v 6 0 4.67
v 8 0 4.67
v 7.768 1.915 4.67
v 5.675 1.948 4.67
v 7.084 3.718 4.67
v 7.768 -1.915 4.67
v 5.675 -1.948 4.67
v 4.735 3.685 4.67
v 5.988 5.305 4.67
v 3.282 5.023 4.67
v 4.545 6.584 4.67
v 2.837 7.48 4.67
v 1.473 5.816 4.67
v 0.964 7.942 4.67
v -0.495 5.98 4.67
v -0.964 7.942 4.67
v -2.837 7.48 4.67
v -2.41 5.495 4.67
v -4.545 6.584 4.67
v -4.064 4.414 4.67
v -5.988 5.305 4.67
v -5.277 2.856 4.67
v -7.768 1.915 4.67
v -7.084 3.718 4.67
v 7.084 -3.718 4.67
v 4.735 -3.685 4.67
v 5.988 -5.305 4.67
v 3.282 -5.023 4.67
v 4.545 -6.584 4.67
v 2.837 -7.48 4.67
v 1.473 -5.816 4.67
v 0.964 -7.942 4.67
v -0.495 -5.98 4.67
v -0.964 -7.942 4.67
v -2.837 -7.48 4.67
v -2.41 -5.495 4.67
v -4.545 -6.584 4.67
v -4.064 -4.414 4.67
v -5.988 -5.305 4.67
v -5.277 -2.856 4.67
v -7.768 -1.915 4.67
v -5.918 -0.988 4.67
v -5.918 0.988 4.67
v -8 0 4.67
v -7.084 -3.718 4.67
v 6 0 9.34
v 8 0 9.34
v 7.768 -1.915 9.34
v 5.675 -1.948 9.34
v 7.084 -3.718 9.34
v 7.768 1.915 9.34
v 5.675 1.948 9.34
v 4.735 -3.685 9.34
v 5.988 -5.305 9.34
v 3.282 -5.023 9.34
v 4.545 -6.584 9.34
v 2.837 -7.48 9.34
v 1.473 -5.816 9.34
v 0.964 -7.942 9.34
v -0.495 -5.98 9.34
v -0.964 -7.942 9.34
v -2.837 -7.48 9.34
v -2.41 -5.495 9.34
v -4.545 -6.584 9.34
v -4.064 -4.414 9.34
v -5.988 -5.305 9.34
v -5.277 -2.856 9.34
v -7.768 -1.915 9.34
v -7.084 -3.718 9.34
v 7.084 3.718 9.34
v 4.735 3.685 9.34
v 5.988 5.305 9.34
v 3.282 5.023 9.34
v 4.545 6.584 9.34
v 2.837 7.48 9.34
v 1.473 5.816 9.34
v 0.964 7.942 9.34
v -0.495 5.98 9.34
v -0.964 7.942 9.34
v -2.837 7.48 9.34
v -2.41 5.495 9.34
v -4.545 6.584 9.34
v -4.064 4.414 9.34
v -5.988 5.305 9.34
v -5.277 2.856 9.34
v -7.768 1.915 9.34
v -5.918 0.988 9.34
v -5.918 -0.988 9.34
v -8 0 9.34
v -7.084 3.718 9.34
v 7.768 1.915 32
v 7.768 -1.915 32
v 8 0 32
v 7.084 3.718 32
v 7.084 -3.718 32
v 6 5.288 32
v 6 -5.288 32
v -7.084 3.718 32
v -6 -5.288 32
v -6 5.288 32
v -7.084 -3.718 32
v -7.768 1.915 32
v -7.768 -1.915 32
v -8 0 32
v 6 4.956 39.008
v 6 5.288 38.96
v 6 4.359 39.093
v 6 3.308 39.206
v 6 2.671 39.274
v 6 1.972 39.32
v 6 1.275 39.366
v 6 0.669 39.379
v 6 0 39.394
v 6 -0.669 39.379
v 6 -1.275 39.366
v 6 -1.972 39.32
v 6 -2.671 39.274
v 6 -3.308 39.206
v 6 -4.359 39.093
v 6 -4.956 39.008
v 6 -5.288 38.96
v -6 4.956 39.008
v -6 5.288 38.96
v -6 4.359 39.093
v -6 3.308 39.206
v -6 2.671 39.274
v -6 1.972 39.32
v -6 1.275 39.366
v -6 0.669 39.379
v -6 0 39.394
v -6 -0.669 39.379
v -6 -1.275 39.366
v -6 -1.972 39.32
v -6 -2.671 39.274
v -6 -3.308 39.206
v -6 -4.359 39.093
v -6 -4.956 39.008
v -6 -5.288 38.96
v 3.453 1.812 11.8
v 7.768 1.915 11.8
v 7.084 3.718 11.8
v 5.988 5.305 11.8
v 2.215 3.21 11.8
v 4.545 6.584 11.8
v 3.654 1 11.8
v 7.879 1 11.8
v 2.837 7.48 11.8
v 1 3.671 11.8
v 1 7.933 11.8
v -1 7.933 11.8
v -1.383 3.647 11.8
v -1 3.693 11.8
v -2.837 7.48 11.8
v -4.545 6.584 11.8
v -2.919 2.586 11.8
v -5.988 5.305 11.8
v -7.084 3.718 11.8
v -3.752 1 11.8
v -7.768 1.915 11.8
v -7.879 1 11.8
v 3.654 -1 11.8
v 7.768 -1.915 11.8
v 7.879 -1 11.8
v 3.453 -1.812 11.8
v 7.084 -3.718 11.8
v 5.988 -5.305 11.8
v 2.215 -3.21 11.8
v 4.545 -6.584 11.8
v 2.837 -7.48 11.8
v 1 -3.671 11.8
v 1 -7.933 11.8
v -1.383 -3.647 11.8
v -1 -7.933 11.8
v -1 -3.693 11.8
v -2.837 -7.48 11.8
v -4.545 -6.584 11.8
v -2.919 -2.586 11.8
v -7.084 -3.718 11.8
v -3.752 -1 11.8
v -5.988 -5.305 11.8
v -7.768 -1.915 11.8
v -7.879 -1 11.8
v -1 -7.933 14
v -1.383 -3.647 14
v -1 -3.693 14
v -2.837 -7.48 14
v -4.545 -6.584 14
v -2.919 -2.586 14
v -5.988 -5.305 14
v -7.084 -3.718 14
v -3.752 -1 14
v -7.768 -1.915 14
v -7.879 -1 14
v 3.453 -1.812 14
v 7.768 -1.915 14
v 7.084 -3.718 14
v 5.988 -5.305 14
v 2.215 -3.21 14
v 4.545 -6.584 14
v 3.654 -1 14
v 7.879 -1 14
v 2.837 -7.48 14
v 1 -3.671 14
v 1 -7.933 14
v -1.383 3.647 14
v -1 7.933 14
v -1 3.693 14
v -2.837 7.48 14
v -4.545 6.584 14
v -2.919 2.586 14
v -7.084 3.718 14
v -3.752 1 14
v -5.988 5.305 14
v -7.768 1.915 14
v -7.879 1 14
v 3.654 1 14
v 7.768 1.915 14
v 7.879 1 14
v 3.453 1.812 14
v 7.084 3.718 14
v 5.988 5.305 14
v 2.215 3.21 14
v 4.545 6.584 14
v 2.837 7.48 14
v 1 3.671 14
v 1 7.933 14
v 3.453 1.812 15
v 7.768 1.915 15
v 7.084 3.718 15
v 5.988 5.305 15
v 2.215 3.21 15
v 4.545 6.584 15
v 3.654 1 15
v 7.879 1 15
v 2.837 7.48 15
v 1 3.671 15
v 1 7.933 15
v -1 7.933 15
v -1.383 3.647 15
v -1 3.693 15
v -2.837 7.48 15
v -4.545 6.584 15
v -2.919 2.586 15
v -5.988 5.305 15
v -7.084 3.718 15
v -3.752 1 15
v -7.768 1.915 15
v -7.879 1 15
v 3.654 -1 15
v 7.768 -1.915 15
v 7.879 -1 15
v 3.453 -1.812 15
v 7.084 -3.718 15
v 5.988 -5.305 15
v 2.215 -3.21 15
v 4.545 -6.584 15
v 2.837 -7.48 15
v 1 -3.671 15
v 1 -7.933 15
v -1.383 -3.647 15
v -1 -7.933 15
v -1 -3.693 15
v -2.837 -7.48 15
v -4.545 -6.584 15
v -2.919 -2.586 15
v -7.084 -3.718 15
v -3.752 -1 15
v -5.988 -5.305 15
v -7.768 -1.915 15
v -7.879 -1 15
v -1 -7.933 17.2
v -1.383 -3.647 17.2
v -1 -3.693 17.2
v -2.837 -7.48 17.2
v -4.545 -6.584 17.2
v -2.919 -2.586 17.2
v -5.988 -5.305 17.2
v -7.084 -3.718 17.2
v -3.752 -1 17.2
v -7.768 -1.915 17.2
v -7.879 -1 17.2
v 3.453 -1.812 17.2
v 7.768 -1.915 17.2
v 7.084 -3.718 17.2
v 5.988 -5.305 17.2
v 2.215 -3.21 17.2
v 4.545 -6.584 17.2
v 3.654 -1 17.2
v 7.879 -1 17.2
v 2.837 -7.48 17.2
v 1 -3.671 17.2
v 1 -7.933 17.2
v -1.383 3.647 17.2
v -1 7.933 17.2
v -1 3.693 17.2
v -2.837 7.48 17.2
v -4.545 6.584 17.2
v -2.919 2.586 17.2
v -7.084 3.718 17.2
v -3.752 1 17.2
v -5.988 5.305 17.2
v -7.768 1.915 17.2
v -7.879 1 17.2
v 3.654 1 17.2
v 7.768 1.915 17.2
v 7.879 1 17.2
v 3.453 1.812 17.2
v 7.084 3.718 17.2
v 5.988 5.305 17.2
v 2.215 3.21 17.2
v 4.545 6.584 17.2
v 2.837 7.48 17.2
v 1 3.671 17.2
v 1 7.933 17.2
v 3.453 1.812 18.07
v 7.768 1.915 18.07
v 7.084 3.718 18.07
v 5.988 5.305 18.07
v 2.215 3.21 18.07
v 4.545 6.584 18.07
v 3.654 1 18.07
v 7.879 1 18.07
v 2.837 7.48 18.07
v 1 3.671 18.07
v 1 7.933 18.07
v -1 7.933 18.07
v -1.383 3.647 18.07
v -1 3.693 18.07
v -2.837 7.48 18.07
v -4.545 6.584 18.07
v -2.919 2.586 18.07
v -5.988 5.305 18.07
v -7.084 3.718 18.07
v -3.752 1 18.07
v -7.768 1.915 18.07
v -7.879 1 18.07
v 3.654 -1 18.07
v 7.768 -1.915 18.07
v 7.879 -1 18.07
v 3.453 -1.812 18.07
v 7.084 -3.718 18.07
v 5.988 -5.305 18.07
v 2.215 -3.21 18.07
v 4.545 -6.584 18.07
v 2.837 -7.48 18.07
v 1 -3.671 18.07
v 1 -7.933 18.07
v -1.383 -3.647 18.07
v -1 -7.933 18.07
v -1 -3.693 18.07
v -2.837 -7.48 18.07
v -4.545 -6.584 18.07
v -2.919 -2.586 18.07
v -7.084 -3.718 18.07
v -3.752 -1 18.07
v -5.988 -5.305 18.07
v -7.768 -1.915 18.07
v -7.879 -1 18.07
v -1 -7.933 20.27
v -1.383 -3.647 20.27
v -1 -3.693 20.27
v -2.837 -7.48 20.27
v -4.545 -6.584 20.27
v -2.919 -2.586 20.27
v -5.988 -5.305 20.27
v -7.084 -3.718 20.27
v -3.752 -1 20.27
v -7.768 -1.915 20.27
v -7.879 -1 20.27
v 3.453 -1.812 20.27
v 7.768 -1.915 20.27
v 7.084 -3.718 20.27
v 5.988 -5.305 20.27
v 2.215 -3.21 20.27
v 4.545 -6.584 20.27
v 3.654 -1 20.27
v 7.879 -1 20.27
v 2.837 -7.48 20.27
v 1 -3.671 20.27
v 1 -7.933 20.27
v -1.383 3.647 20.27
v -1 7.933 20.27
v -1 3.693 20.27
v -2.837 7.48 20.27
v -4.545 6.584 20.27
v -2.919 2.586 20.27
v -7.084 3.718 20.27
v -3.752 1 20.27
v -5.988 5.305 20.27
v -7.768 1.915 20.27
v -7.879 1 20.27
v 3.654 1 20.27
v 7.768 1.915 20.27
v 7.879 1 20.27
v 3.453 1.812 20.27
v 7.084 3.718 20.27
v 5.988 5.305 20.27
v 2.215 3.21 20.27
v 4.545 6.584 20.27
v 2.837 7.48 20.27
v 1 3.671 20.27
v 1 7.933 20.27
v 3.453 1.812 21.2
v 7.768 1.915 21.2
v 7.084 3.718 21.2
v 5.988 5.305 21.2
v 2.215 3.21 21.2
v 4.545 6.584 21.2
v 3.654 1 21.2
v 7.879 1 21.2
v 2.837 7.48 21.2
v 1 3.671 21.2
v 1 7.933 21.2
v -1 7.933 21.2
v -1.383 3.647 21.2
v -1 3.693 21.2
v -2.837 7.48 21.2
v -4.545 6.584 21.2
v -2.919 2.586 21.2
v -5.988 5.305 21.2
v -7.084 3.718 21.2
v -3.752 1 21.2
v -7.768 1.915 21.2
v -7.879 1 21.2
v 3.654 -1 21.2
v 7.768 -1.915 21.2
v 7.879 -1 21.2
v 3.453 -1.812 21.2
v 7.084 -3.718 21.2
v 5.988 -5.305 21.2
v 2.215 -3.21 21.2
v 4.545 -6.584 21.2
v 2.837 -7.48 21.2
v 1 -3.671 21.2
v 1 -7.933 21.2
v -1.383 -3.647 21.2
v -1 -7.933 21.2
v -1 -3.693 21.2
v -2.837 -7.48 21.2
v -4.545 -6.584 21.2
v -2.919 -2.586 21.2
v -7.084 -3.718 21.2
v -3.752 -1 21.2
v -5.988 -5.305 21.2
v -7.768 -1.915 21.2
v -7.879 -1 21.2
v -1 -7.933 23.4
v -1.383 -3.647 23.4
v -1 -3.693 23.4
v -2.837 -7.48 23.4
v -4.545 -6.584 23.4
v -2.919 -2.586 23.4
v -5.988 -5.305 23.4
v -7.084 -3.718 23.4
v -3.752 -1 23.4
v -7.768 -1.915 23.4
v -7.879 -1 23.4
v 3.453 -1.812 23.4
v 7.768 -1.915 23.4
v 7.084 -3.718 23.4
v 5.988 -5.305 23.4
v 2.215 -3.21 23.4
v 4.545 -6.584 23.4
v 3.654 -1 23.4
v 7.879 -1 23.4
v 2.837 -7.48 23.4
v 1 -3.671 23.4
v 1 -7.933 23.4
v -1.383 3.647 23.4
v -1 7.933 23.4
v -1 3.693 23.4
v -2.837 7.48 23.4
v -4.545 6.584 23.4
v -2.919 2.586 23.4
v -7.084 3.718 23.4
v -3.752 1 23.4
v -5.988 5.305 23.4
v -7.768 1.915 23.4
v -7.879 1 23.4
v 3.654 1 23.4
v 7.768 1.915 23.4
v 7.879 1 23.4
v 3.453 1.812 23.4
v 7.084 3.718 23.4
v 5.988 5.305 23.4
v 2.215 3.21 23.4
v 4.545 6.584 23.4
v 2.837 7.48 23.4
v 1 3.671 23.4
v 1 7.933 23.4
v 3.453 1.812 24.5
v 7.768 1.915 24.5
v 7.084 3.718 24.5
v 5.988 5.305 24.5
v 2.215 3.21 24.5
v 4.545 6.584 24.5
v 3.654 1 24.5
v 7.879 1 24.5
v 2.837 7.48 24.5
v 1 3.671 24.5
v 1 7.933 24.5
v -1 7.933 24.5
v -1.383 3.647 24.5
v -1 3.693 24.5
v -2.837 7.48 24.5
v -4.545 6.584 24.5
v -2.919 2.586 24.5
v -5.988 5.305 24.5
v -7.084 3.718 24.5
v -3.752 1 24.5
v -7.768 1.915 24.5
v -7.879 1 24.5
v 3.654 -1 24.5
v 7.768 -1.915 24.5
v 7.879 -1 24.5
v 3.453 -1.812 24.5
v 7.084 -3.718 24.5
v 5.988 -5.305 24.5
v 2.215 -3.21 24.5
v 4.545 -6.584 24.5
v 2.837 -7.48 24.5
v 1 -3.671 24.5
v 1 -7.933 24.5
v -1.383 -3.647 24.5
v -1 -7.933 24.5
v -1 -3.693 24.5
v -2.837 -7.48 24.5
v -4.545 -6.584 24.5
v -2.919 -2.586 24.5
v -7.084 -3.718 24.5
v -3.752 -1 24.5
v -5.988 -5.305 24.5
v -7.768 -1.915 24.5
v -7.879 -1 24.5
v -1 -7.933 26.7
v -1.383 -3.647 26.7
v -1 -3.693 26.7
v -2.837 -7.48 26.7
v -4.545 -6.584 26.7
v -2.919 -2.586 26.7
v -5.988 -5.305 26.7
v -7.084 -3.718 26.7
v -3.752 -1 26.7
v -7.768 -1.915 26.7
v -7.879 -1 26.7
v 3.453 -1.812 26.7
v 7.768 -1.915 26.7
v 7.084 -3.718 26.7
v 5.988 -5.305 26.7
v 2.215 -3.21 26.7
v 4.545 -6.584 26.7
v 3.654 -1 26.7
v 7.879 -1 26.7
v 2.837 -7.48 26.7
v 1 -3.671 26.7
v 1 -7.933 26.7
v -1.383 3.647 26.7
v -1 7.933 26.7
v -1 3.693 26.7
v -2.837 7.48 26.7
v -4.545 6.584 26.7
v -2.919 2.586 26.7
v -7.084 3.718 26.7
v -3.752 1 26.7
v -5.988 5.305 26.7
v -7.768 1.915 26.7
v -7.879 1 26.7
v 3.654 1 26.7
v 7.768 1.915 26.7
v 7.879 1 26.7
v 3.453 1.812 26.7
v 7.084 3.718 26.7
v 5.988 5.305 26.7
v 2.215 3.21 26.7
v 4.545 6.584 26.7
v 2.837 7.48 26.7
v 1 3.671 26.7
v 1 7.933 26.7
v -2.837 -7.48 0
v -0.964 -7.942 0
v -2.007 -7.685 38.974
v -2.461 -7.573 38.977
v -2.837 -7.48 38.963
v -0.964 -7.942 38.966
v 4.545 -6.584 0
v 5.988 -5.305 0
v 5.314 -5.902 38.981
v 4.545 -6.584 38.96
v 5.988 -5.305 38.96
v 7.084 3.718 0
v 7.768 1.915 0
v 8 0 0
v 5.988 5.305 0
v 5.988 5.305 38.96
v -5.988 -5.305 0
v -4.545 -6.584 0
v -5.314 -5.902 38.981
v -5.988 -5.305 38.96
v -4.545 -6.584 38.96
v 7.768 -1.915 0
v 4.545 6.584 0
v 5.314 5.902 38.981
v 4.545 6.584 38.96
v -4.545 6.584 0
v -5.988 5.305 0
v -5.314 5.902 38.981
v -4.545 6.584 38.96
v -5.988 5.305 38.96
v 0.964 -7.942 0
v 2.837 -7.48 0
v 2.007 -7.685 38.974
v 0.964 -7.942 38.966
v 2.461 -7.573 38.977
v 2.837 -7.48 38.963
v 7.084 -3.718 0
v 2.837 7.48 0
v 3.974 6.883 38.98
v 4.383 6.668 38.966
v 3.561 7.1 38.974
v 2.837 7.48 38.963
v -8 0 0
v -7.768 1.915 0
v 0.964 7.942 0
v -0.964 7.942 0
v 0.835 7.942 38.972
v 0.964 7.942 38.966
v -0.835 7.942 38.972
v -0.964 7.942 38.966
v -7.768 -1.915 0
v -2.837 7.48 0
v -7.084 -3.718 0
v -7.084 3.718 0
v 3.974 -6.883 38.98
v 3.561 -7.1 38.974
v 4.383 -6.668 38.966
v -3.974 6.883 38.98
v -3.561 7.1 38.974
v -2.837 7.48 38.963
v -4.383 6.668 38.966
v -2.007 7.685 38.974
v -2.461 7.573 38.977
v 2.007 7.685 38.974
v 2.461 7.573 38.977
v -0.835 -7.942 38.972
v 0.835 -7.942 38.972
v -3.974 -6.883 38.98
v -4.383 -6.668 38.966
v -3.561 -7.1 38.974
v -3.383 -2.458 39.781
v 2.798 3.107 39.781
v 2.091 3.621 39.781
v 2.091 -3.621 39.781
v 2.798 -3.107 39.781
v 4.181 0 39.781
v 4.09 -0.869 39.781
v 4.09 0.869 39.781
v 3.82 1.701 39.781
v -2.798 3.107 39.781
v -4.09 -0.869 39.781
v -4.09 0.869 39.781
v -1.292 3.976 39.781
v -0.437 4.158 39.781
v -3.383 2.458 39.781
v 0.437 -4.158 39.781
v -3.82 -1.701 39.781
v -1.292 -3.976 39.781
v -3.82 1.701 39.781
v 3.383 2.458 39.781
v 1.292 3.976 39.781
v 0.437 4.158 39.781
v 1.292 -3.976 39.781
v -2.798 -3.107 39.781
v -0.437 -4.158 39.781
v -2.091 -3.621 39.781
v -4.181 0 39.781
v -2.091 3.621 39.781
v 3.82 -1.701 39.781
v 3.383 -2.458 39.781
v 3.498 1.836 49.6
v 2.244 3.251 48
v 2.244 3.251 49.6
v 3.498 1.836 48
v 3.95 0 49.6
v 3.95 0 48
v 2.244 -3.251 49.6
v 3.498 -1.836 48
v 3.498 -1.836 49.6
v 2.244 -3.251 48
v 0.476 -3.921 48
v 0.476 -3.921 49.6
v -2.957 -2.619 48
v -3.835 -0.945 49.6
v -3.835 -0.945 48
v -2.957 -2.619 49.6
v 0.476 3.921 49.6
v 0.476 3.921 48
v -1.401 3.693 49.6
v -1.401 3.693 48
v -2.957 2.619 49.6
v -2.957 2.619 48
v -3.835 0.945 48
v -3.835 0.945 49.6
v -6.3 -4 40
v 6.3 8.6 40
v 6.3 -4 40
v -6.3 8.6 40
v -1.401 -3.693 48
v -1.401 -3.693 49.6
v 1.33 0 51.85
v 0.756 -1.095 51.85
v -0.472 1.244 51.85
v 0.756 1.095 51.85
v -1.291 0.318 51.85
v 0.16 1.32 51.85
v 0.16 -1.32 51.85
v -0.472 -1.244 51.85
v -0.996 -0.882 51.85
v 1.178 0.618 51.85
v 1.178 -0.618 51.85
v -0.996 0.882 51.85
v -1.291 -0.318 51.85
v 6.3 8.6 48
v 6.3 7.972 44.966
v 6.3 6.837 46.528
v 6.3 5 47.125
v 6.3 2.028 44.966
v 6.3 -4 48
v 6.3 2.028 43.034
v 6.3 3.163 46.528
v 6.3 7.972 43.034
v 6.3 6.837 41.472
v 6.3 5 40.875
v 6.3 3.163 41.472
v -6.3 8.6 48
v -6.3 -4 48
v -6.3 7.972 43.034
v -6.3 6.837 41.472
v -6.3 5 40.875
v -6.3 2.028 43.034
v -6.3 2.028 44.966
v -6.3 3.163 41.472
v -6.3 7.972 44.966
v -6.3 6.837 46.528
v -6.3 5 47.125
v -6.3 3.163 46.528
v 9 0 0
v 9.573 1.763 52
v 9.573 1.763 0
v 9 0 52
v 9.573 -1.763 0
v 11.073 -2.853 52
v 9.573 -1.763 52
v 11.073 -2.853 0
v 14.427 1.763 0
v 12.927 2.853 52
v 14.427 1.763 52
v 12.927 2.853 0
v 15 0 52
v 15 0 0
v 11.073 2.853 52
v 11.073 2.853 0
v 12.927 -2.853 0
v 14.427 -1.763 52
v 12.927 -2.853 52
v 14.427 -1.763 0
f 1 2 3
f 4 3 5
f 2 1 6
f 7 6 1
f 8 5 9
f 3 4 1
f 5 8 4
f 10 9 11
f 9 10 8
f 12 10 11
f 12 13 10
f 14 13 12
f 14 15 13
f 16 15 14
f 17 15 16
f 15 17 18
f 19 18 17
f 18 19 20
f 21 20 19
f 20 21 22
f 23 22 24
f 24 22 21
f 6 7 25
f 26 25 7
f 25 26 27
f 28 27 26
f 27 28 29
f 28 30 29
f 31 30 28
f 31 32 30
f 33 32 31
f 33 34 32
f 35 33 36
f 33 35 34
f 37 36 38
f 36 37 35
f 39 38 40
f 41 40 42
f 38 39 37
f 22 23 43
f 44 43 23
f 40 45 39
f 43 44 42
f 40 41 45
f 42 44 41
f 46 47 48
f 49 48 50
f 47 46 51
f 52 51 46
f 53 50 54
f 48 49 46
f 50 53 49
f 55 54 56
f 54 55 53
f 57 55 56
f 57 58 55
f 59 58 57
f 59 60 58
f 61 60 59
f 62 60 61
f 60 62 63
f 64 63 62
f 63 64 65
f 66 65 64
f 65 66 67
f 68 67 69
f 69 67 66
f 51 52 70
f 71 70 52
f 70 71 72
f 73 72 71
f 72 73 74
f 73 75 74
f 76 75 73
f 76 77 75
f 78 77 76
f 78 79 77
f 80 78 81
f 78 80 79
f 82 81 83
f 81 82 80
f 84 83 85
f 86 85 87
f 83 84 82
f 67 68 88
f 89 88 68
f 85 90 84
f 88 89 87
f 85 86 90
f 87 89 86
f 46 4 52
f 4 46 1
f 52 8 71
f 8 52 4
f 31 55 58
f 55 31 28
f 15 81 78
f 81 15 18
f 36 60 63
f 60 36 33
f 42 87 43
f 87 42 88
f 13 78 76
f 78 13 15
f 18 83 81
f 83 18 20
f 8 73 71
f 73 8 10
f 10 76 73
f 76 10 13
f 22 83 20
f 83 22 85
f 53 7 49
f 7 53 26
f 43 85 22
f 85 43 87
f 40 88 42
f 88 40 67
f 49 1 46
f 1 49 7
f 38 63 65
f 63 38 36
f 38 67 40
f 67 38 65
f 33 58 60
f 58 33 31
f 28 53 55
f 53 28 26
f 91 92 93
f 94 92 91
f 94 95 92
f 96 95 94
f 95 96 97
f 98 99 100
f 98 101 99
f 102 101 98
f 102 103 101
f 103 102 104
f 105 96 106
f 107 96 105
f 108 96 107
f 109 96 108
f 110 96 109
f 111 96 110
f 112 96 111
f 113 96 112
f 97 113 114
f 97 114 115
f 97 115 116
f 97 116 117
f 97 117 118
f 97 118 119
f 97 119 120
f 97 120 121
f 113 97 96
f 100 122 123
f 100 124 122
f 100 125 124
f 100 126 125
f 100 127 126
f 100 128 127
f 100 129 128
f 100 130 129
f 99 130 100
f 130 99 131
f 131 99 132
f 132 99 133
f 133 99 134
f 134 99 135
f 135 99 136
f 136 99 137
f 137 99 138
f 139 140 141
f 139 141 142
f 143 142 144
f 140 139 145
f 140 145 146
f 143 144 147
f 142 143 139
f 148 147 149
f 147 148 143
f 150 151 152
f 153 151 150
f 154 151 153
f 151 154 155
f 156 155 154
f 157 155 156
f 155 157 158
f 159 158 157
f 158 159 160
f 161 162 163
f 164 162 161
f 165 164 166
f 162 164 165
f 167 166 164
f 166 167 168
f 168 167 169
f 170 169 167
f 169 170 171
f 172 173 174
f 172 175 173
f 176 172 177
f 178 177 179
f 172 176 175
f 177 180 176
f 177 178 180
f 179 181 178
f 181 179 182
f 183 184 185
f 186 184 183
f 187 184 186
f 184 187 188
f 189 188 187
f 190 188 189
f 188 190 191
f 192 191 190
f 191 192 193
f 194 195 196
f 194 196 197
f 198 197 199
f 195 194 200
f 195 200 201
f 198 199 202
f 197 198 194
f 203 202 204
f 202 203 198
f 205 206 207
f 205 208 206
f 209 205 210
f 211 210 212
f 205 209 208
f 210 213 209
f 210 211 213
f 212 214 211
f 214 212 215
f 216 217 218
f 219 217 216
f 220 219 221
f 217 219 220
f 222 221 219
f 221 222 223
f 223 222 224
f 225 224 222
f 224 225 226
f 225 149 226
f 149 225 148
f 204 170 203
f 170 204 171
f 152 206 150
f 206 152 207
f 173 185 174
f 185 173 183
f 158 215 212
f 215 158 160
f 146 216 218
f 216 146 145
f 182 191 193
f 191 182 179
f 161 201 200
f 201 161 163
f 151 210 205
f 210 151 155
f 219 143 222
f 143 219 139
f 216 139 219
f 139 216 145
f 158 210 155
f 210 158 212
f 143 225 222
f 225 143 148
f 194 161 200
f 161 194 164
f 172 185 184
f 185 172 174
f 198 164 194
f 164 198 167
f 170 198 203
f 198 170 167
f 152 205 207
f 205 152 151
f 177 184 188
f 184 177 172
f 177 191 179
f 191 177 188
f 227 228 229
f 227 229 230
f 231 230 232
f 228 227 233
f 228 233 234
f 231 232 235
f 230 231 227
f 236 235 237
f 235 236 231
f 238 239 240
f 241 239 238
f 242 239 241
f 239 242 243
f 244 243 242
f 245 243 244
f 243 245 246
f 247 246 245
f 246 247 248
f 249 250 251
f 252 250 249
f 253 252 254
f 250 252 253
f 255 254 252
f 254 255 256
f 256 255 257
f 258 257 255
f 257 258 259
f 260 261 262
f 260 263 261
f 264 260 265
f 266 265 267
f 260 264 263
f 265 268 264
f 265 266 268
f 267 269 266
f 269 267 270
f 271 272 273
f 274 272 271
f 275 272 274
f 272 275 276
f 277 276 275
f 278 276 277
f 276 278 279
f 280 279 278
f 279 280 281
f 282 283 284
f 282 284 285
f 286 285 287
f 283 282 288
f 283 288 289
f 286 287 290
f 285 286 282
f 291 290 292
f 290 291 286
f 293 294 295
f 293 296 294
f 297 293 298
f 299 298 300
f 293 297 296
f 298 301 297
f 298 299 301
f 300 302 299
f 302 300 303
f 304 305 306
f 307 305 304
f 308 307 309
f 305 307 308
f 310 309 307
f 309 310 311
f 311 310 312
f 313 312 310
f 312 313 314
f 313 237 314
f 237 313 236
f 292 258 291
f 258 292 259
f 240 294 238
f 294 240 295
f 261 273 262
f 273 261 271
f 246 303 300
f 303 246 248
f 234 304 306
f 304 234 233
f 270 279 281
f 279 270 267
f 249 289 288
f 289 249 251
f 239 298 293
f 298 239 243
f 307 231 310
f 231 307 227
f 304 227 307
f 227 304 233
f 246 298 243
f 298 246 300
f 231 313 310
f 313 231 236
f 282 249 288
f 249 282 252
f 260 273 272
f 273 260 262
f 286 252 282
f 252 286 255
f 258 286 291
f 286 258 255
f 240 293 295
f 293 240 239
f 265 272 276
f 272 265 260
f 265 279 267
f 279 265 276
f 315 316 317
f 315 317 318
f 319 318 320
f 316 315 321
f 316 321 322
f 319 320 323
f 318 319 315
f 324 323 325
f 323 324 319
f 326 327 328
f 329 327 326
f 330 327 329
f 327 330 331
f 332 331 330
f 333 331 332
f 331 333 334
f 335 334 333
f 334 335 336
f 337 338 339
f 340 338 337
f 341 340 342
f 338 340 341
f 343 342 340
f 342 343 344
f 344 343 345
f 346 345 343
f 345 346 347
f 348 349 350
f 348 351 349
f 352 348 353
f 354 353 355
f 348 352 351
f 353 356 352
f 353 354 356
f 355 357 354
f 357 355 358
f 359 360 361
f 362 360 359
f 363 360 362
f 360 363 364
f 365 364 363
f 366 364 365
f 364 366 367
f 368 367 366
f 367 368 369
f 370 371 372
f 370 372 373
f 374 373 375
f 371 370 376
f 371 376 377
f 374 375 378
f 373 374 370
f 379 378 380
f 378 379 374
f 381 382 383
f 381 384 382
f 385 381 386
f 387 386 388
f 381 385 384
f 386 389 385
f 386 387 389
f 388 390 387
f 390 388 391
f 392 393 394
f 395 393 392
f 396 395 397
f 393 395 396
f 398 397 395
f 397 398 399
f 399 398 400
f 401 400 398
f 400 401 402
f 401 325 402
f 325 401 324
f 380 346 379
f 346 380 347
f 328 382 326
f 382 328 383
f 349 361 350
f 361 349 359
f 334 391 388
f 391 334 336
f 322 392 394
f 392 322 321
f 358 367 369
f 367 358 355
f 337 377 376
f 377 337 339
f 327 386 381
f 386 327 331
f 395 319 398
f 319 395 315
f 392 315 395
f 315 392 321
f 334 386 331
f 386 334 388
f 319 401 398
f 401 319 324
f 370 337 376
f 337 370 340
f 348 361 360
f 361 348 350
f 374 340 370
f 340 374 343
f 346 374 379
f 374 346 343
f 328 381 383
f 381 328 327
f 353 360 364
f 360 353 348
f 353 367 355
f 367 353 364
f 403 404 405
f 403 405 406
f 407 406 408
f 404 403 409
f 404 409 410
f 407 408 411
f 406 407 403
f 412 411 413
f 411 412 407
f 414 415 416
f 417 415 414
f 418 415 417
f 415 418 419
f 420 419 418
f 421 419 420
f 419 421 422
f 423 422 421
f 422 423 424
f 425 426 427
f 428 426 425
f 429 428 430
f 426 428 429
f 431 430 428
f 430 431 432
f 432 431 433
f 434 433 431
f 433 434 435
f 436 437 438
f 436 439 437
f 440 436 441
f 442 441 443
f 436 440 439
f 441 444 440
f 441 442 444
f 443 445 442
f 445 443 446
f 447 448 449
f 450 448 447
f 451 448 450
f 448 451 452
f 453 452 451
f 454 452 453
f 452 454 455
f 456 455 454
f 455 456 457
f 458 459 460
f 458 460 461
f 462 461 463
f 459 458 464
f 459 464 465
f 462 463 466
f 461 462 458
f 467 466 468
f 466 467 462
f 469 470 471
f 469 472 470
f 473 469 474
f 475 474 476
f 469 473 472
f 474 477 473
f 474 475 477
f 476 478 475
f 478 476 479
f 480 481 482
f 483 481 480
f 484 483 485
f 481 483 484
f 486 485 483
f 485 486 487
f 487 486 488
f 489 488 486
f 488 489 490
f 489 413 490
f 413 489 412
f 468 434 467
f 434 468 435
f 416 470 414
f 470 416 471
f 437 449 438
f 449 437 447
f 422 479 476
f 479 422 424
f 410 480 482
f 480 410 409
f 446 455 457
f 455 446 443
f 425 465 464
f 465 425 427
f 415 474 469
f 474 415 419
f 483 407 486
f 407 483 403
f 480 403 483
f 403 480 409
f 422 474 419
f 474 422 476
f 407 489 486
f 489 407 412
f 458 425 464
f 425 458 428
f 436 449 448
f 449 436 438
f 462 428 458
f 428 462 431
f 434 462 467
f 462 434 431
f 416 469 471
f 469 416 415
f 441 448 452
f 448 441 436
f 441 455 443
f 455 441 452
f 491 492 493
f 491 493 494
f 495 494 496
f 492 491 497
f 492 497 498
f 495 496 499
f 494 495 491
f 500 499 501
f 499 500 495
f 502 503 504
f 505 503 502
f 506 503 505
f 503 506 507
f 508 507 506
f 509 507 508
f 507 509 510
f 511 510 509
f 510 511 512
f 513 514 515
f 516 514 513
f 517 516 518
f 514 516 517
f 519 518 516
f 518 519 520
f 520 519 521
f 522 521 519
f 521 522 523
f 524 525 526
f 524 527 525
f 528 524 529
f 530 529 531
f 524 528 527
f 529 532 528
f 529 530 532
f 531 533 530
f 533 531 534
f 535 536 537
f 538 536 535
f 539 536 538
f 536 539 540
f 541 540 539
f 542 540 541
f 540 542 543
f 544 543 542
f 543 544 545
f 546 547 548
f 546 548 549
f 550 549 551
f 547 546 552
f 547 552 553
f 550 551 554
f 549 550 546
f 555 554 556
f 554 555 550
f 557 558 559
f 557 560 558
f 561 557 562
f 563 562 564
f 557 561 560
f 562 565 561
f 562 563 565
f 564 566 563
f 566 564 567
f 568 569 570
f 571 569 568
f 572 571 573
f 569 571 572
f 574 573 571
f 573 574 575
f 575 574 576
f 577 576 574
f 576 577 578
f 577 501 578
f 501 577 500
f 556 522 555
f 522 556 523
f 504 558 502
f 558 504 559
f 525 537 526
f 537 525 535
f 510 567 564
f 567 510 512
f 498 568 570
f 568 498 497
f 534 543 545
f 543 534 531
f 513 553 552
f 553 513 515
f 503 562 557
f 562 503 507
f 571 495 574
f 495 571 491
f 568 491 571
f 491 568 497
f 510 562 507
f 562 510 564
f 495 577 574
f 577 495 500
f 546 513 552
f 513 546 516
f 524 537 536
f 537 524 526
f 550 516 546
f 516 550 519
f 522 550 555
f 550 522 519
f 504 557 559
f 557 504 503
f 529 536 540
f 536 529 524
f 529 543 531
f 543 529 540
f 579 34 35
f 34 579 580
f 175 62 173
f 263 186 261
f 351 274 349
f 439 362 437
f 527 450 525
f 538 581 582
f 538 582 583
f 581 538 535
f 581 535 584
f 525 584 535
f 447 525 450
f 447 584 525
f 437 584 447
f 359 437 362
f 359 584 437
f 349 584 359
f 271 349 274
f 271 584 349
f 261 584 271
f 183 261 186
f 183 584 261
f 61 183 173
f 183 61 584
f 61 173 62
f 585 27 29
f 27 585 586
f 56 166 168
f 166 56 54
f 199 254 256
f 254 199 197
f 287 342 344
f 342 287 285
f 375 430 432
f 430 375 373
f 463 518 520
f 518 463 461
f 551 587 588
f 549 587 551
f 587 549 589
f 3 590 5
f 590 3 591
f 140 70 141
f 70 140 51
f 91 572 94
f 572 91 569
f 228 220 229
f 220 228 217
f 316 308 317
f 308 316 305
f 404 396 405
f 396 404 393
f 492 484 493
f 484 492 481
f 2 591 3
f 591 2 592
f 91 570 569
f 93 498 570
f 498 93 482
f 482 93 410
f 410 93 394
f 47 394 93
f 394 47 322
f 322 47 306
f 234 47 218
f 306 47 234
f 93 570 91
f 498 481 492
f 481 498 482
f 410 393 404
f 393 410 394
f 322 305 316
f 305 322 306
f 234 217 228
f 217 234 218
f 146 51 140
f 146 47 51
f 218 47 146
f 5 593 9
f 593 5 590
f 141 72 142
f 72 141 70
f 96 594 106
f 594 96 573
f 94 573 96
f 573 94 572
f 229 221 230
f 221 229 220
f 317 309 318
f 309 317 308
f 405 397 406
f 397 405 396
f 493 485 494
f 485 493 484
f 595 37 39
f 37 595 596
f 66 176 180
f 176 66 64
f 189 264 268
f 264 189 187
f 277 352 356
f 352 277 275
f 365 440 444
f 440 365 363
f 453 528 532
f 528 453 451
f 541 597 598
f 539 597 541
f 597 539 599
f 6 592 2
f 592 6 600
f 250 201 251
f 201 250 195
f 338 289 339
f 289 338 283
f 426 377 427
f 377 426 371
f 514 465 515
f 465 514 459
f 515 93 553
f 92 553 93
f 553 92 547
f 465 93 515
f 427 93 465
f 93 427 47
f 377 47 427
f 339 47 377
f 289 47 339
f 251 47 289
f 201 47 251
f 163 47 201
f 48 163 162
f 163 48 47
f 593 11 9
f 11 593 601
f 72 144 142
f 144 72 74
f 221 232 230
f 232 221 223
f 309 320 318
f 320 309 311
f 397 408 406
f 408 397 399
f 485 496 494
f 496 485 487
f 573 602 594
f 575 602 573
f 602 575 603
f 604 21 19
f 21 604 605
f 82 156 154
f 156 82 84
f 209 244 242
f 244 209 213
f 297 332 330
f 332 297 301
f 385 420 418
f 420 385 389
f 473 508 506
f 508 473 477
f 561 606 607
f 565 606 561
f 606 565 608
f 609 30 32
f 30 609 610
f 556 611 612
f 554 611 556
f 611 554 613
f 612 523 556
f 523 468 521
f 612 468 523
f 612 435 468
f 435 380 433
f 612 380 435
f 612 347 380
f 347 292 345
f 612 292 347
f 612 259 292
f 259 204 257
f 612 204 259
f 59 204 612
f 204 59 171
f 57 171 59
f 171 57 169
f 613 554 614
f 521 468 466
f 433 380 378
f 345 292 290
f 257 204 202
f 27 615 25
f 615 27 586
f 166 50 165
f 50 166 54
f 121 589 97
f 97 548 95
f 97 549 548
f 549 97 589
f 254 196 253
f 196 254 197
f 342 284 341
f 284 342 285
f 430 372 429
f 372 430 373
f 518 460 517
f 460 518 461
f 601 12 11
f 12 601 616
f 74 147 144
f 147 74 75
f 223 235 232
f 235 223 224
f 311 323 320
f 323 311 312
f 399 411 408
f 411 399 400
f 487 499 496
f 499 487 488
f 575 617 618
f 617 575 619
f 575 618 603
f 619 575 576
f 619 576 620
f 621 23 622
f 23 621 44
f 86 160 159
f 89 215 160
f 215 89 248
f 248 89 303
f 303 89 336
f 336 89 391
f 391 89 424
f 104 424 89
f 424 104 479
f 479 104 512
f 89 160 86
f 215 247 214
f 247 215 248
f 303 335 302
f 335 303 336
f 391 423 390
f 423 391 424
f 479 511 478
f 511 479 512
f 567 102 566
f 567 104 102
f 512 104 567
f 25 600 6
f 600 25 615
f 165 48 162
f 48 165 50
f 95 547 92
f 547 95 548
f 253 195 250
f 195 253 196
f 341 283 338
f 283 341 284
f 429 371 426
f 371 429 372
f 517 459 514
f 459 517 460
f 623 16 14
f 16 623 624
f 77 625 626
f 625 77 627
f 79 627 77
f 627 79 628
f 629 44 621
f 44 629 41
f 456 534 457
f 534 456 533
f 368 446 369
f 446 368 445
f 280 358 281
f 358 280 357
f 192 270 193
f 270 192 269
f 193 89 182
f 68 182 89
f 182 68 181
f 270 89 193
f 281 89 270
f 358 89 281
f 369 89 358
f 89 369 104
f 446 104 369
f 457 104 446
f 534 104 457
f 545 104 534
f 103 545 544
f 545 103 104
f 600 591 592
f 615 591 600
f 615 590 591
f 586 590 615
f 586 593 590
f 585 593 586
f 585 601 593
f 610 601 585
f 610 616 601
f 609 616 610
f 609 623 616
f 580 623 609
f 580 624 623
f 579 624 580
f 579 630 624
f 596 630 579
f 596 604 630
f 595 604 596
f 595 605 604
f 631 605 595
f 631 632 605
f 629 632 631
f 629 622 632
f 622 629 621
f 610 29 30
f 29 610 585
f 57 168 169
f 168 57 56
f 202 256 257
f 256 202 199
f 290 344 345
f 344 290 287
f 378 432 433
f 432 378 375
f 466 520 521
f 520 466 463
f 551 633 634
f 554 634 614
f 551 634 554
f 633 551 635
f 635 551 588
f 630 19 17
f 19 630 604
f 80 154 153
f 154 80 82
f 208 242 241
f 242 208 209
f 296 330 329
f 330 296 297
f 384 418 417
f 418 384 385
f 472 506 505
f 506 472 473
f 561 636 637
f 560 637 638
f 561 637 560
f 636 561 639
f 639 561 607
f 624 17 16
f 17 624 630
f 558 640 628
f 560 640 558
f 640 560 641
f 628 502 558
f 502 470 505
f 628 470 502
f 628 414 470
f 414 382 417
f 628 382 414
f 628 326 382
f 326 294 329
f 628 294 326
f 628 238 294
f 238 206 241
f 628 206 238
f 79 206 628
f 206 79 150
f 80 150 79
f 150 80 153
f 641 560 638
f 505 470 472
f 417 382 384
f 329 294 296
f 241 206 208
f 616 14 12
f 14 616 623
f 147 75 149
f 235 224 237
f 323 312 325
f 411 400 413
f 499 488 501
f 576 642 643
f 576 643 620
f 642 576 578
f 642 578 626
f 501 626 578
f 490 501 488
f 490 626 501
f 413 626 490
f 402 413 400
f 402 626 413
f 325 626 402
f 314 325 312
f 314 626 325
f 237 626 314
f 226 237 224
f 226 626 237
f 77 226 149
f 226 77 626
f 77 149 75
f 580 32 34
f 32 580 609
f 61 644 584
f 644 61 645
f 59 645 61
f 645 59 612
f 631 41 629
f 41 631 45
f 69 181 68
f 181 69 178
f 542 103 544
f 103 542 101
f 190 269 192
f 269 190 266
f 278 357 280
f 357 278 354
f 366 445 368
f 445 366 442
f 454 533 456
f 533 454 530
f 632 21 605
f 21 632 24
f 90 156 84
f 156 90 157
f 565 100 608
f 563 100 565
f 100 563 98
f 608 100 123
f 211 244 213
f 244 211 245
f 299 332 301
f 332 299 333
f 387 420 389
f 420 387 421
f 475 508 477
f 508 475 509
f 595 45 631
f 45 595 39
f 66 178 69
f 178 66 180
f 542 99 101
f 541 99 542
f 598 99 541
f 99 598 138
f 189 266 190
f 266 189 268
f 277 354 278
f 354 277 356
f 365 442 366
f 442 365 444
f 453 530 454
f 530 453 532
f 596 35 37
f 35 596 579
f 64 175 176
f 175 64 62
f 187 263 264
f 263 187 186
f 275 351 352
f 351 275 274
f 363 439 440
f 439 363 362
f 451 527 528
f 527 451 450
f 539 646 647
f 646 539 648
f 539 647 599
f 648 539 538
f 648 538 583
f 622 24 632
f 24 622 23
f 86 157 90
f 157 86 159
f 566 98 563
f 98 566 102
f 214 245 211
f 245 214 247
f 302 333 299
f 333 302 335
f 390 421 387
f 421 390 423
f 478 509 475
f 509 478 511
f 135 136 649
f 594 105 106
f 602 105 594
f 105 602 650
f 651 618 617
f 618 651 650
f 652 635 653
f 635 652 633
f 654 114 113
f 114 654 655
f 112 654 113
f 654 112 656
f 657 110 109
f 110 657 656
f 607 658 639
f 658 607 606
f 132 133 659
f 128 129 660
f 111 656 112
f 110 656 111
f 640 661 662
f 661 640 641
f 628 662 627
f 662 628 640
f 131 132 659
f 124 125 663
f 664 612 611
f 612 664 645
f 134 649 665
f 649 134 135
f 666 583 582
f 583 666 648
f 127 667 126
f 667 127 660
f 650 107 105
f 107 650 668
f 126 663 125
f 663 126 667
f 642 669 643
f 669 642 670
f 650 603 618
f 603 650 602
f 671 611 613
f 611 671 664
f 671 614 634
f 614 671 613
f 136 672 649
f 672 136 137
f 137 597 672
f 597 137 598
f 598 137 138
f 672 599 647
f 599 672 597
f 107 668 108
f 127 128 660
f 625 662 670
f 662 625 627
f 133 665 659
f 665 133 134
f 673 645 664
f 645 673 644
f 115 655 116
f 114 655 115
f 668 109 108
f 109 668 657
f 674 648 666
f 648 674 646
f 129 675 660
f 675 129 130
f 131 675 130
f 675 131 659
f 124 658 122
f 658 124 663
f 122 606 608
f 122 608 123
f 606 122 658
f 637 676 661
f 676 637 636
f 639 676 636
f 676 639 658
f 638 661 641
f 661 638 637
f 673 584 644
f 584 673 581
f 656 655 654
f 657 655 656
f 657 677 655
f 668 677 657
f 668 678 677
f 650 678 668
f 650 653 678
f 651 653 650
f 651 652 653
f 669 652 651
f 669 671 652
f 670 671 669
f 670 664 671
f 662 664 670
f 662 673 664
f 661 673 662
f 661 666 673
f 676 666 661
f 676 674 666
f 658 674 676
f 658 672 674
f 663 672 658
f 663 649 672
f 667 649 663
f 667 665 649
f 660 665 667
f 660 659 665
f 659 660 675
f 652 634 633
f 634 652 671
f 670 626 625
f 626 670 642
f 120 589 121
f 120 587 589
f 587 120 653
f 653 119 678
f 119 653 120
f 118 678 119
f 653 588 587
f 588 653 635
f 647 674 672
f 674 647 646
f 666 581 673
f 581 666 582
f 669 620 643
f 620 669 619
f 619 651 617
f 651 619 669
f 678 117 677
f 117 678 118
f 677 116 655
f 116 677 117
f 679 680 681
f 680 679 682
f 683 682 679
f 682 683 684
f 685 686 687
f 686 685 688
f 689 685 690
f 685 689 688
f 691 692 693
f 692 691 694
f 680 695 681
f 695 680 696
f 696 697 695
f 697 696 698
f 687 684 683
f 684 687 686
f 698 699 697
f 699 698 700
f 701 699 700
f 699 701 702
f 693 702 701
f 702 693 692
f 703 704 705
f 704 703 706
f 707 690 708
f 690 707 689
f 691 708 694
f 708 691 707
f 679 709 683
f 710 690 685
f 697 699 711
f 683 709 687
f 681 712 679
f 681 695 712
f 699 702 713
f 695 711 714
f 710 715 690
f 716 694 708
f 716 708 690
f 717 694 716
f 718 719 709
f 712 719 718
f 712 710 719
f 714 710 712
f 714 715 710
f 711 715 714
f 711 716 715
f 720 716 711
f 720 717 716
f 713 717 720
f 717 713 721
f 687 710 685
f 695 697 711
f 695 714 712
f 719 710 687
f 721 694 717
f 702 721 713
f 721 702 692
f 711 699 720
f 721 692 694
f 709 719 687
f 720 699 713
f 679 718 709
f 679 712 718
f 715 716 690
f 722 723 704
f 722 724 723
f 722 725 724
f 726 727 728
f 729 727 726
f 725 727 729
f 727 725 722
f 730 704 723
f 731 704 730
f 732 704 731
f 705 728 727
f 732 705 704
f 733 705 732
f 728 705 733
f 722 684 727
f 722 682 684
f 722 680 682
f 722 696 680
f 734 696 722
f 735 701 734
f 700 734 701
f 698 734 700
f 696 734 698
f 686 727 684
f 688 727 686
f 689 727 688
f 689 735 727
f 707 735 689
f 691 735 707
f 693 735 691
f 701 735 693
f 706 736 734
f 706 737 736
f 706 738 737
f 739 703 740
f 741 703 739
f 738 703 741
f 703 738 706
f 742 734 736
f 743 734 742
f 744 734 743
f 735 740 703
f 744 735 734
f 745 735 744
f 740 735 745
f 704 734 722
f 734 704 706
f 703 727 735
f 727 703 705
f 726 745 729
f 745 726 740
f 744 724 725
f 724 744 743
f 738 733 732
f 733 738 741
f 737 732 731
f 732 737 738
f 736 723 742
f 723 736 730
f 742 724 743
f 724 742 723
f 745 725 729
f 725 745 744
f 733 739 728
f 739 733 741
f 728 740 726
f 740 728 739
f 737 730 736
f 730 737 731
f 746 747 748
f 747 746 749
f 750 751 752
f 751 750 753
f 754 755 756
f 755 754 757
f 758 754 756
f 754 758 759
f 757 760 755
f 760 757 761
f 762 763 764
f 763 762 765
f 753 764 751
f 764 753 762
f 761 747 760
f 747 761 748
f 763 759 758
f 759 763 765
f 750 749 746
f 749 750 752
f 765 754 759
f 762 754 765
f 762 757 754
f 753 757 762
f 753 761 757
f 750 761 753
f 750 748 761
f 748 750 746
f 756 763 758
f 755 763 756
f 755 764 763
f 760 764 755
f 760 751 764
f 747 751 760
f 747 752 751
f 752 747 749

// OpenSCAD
hotend_jhead();

debug_len = 52;
translate([12,0,debug_len/2]) cylinder(r=3,h=debug_len,center=true);

module hotend_jhead() {
	translate([0,0,0])  jhead_plastic_body();
	translate([0,0,40]) jhead_brass_nozzle();
}

module jhead_plastic_body() {
	intersection() {
	difference() {
		cylinder(h=40,r=8);
		translate([0,0,4.67]) jhead_groovemount_cutout();
	
		// add the wrench flats
		translate([0,0,32]) jhead_wrench_cutout();
		
		// add (crappy) cooling grooves
		translate([0,0,11.80]) jhead_cooling_cutout();
		translate([0,0,15.00]) jhead_cooling_cutout();
		translate([0,0,18.07]) jhead_cooling_cutout();
		translate([0,0,21.20]) jhead_cooling_cutout();
		translate([0,0,24.50]) jhead_cooling_cutout();
	}
	// get the rounded bit at the end
	sphere(r=40);
	}
}

module jhead_groovemount_cutout() {
	difference() {
		cylinder(h=4.67,r=10);
		cylinder(h=4.67,r=6);
	}
}

module jhead_wrench_cutout() {
	difference() {
		translate([-10,-10,0]) cube([20,20,8]);
		translate([-6,-10,0])  cube([12,20,8]);
	}
}

module jhead_cooling_cutout() {
	render() difference() {
		difference() {
			cylinder(h=2.20,r=10);		
			translate([-1,-10,0]) cube([2,20,2.2]);
			translate([-10,-1,0]) cube([20,2,2.2]);
		}
		cylinder(h=2.20,r=3.9);
	}
}

module jhead_brass_nozzle() { 
	// heater body 12.65 x 12.65 x 8
	//
	//
	difference() {
	union() {
	// draw the cylinder and cap it with the nozzle
	translate([0,0,0])     cylinder(h=9.60, r=3.95);
	translate([0,0,9.6])   cylinder(h=2.25, r1=3.95, r2=1.33);
	translate([-6.3,-4,0]) cube([12.6,12.6,8]);
	}
	translate([6.4,5,4]) rotate([0,270,0]) cylinder(h=12.8,r=3.125);
	}
}
